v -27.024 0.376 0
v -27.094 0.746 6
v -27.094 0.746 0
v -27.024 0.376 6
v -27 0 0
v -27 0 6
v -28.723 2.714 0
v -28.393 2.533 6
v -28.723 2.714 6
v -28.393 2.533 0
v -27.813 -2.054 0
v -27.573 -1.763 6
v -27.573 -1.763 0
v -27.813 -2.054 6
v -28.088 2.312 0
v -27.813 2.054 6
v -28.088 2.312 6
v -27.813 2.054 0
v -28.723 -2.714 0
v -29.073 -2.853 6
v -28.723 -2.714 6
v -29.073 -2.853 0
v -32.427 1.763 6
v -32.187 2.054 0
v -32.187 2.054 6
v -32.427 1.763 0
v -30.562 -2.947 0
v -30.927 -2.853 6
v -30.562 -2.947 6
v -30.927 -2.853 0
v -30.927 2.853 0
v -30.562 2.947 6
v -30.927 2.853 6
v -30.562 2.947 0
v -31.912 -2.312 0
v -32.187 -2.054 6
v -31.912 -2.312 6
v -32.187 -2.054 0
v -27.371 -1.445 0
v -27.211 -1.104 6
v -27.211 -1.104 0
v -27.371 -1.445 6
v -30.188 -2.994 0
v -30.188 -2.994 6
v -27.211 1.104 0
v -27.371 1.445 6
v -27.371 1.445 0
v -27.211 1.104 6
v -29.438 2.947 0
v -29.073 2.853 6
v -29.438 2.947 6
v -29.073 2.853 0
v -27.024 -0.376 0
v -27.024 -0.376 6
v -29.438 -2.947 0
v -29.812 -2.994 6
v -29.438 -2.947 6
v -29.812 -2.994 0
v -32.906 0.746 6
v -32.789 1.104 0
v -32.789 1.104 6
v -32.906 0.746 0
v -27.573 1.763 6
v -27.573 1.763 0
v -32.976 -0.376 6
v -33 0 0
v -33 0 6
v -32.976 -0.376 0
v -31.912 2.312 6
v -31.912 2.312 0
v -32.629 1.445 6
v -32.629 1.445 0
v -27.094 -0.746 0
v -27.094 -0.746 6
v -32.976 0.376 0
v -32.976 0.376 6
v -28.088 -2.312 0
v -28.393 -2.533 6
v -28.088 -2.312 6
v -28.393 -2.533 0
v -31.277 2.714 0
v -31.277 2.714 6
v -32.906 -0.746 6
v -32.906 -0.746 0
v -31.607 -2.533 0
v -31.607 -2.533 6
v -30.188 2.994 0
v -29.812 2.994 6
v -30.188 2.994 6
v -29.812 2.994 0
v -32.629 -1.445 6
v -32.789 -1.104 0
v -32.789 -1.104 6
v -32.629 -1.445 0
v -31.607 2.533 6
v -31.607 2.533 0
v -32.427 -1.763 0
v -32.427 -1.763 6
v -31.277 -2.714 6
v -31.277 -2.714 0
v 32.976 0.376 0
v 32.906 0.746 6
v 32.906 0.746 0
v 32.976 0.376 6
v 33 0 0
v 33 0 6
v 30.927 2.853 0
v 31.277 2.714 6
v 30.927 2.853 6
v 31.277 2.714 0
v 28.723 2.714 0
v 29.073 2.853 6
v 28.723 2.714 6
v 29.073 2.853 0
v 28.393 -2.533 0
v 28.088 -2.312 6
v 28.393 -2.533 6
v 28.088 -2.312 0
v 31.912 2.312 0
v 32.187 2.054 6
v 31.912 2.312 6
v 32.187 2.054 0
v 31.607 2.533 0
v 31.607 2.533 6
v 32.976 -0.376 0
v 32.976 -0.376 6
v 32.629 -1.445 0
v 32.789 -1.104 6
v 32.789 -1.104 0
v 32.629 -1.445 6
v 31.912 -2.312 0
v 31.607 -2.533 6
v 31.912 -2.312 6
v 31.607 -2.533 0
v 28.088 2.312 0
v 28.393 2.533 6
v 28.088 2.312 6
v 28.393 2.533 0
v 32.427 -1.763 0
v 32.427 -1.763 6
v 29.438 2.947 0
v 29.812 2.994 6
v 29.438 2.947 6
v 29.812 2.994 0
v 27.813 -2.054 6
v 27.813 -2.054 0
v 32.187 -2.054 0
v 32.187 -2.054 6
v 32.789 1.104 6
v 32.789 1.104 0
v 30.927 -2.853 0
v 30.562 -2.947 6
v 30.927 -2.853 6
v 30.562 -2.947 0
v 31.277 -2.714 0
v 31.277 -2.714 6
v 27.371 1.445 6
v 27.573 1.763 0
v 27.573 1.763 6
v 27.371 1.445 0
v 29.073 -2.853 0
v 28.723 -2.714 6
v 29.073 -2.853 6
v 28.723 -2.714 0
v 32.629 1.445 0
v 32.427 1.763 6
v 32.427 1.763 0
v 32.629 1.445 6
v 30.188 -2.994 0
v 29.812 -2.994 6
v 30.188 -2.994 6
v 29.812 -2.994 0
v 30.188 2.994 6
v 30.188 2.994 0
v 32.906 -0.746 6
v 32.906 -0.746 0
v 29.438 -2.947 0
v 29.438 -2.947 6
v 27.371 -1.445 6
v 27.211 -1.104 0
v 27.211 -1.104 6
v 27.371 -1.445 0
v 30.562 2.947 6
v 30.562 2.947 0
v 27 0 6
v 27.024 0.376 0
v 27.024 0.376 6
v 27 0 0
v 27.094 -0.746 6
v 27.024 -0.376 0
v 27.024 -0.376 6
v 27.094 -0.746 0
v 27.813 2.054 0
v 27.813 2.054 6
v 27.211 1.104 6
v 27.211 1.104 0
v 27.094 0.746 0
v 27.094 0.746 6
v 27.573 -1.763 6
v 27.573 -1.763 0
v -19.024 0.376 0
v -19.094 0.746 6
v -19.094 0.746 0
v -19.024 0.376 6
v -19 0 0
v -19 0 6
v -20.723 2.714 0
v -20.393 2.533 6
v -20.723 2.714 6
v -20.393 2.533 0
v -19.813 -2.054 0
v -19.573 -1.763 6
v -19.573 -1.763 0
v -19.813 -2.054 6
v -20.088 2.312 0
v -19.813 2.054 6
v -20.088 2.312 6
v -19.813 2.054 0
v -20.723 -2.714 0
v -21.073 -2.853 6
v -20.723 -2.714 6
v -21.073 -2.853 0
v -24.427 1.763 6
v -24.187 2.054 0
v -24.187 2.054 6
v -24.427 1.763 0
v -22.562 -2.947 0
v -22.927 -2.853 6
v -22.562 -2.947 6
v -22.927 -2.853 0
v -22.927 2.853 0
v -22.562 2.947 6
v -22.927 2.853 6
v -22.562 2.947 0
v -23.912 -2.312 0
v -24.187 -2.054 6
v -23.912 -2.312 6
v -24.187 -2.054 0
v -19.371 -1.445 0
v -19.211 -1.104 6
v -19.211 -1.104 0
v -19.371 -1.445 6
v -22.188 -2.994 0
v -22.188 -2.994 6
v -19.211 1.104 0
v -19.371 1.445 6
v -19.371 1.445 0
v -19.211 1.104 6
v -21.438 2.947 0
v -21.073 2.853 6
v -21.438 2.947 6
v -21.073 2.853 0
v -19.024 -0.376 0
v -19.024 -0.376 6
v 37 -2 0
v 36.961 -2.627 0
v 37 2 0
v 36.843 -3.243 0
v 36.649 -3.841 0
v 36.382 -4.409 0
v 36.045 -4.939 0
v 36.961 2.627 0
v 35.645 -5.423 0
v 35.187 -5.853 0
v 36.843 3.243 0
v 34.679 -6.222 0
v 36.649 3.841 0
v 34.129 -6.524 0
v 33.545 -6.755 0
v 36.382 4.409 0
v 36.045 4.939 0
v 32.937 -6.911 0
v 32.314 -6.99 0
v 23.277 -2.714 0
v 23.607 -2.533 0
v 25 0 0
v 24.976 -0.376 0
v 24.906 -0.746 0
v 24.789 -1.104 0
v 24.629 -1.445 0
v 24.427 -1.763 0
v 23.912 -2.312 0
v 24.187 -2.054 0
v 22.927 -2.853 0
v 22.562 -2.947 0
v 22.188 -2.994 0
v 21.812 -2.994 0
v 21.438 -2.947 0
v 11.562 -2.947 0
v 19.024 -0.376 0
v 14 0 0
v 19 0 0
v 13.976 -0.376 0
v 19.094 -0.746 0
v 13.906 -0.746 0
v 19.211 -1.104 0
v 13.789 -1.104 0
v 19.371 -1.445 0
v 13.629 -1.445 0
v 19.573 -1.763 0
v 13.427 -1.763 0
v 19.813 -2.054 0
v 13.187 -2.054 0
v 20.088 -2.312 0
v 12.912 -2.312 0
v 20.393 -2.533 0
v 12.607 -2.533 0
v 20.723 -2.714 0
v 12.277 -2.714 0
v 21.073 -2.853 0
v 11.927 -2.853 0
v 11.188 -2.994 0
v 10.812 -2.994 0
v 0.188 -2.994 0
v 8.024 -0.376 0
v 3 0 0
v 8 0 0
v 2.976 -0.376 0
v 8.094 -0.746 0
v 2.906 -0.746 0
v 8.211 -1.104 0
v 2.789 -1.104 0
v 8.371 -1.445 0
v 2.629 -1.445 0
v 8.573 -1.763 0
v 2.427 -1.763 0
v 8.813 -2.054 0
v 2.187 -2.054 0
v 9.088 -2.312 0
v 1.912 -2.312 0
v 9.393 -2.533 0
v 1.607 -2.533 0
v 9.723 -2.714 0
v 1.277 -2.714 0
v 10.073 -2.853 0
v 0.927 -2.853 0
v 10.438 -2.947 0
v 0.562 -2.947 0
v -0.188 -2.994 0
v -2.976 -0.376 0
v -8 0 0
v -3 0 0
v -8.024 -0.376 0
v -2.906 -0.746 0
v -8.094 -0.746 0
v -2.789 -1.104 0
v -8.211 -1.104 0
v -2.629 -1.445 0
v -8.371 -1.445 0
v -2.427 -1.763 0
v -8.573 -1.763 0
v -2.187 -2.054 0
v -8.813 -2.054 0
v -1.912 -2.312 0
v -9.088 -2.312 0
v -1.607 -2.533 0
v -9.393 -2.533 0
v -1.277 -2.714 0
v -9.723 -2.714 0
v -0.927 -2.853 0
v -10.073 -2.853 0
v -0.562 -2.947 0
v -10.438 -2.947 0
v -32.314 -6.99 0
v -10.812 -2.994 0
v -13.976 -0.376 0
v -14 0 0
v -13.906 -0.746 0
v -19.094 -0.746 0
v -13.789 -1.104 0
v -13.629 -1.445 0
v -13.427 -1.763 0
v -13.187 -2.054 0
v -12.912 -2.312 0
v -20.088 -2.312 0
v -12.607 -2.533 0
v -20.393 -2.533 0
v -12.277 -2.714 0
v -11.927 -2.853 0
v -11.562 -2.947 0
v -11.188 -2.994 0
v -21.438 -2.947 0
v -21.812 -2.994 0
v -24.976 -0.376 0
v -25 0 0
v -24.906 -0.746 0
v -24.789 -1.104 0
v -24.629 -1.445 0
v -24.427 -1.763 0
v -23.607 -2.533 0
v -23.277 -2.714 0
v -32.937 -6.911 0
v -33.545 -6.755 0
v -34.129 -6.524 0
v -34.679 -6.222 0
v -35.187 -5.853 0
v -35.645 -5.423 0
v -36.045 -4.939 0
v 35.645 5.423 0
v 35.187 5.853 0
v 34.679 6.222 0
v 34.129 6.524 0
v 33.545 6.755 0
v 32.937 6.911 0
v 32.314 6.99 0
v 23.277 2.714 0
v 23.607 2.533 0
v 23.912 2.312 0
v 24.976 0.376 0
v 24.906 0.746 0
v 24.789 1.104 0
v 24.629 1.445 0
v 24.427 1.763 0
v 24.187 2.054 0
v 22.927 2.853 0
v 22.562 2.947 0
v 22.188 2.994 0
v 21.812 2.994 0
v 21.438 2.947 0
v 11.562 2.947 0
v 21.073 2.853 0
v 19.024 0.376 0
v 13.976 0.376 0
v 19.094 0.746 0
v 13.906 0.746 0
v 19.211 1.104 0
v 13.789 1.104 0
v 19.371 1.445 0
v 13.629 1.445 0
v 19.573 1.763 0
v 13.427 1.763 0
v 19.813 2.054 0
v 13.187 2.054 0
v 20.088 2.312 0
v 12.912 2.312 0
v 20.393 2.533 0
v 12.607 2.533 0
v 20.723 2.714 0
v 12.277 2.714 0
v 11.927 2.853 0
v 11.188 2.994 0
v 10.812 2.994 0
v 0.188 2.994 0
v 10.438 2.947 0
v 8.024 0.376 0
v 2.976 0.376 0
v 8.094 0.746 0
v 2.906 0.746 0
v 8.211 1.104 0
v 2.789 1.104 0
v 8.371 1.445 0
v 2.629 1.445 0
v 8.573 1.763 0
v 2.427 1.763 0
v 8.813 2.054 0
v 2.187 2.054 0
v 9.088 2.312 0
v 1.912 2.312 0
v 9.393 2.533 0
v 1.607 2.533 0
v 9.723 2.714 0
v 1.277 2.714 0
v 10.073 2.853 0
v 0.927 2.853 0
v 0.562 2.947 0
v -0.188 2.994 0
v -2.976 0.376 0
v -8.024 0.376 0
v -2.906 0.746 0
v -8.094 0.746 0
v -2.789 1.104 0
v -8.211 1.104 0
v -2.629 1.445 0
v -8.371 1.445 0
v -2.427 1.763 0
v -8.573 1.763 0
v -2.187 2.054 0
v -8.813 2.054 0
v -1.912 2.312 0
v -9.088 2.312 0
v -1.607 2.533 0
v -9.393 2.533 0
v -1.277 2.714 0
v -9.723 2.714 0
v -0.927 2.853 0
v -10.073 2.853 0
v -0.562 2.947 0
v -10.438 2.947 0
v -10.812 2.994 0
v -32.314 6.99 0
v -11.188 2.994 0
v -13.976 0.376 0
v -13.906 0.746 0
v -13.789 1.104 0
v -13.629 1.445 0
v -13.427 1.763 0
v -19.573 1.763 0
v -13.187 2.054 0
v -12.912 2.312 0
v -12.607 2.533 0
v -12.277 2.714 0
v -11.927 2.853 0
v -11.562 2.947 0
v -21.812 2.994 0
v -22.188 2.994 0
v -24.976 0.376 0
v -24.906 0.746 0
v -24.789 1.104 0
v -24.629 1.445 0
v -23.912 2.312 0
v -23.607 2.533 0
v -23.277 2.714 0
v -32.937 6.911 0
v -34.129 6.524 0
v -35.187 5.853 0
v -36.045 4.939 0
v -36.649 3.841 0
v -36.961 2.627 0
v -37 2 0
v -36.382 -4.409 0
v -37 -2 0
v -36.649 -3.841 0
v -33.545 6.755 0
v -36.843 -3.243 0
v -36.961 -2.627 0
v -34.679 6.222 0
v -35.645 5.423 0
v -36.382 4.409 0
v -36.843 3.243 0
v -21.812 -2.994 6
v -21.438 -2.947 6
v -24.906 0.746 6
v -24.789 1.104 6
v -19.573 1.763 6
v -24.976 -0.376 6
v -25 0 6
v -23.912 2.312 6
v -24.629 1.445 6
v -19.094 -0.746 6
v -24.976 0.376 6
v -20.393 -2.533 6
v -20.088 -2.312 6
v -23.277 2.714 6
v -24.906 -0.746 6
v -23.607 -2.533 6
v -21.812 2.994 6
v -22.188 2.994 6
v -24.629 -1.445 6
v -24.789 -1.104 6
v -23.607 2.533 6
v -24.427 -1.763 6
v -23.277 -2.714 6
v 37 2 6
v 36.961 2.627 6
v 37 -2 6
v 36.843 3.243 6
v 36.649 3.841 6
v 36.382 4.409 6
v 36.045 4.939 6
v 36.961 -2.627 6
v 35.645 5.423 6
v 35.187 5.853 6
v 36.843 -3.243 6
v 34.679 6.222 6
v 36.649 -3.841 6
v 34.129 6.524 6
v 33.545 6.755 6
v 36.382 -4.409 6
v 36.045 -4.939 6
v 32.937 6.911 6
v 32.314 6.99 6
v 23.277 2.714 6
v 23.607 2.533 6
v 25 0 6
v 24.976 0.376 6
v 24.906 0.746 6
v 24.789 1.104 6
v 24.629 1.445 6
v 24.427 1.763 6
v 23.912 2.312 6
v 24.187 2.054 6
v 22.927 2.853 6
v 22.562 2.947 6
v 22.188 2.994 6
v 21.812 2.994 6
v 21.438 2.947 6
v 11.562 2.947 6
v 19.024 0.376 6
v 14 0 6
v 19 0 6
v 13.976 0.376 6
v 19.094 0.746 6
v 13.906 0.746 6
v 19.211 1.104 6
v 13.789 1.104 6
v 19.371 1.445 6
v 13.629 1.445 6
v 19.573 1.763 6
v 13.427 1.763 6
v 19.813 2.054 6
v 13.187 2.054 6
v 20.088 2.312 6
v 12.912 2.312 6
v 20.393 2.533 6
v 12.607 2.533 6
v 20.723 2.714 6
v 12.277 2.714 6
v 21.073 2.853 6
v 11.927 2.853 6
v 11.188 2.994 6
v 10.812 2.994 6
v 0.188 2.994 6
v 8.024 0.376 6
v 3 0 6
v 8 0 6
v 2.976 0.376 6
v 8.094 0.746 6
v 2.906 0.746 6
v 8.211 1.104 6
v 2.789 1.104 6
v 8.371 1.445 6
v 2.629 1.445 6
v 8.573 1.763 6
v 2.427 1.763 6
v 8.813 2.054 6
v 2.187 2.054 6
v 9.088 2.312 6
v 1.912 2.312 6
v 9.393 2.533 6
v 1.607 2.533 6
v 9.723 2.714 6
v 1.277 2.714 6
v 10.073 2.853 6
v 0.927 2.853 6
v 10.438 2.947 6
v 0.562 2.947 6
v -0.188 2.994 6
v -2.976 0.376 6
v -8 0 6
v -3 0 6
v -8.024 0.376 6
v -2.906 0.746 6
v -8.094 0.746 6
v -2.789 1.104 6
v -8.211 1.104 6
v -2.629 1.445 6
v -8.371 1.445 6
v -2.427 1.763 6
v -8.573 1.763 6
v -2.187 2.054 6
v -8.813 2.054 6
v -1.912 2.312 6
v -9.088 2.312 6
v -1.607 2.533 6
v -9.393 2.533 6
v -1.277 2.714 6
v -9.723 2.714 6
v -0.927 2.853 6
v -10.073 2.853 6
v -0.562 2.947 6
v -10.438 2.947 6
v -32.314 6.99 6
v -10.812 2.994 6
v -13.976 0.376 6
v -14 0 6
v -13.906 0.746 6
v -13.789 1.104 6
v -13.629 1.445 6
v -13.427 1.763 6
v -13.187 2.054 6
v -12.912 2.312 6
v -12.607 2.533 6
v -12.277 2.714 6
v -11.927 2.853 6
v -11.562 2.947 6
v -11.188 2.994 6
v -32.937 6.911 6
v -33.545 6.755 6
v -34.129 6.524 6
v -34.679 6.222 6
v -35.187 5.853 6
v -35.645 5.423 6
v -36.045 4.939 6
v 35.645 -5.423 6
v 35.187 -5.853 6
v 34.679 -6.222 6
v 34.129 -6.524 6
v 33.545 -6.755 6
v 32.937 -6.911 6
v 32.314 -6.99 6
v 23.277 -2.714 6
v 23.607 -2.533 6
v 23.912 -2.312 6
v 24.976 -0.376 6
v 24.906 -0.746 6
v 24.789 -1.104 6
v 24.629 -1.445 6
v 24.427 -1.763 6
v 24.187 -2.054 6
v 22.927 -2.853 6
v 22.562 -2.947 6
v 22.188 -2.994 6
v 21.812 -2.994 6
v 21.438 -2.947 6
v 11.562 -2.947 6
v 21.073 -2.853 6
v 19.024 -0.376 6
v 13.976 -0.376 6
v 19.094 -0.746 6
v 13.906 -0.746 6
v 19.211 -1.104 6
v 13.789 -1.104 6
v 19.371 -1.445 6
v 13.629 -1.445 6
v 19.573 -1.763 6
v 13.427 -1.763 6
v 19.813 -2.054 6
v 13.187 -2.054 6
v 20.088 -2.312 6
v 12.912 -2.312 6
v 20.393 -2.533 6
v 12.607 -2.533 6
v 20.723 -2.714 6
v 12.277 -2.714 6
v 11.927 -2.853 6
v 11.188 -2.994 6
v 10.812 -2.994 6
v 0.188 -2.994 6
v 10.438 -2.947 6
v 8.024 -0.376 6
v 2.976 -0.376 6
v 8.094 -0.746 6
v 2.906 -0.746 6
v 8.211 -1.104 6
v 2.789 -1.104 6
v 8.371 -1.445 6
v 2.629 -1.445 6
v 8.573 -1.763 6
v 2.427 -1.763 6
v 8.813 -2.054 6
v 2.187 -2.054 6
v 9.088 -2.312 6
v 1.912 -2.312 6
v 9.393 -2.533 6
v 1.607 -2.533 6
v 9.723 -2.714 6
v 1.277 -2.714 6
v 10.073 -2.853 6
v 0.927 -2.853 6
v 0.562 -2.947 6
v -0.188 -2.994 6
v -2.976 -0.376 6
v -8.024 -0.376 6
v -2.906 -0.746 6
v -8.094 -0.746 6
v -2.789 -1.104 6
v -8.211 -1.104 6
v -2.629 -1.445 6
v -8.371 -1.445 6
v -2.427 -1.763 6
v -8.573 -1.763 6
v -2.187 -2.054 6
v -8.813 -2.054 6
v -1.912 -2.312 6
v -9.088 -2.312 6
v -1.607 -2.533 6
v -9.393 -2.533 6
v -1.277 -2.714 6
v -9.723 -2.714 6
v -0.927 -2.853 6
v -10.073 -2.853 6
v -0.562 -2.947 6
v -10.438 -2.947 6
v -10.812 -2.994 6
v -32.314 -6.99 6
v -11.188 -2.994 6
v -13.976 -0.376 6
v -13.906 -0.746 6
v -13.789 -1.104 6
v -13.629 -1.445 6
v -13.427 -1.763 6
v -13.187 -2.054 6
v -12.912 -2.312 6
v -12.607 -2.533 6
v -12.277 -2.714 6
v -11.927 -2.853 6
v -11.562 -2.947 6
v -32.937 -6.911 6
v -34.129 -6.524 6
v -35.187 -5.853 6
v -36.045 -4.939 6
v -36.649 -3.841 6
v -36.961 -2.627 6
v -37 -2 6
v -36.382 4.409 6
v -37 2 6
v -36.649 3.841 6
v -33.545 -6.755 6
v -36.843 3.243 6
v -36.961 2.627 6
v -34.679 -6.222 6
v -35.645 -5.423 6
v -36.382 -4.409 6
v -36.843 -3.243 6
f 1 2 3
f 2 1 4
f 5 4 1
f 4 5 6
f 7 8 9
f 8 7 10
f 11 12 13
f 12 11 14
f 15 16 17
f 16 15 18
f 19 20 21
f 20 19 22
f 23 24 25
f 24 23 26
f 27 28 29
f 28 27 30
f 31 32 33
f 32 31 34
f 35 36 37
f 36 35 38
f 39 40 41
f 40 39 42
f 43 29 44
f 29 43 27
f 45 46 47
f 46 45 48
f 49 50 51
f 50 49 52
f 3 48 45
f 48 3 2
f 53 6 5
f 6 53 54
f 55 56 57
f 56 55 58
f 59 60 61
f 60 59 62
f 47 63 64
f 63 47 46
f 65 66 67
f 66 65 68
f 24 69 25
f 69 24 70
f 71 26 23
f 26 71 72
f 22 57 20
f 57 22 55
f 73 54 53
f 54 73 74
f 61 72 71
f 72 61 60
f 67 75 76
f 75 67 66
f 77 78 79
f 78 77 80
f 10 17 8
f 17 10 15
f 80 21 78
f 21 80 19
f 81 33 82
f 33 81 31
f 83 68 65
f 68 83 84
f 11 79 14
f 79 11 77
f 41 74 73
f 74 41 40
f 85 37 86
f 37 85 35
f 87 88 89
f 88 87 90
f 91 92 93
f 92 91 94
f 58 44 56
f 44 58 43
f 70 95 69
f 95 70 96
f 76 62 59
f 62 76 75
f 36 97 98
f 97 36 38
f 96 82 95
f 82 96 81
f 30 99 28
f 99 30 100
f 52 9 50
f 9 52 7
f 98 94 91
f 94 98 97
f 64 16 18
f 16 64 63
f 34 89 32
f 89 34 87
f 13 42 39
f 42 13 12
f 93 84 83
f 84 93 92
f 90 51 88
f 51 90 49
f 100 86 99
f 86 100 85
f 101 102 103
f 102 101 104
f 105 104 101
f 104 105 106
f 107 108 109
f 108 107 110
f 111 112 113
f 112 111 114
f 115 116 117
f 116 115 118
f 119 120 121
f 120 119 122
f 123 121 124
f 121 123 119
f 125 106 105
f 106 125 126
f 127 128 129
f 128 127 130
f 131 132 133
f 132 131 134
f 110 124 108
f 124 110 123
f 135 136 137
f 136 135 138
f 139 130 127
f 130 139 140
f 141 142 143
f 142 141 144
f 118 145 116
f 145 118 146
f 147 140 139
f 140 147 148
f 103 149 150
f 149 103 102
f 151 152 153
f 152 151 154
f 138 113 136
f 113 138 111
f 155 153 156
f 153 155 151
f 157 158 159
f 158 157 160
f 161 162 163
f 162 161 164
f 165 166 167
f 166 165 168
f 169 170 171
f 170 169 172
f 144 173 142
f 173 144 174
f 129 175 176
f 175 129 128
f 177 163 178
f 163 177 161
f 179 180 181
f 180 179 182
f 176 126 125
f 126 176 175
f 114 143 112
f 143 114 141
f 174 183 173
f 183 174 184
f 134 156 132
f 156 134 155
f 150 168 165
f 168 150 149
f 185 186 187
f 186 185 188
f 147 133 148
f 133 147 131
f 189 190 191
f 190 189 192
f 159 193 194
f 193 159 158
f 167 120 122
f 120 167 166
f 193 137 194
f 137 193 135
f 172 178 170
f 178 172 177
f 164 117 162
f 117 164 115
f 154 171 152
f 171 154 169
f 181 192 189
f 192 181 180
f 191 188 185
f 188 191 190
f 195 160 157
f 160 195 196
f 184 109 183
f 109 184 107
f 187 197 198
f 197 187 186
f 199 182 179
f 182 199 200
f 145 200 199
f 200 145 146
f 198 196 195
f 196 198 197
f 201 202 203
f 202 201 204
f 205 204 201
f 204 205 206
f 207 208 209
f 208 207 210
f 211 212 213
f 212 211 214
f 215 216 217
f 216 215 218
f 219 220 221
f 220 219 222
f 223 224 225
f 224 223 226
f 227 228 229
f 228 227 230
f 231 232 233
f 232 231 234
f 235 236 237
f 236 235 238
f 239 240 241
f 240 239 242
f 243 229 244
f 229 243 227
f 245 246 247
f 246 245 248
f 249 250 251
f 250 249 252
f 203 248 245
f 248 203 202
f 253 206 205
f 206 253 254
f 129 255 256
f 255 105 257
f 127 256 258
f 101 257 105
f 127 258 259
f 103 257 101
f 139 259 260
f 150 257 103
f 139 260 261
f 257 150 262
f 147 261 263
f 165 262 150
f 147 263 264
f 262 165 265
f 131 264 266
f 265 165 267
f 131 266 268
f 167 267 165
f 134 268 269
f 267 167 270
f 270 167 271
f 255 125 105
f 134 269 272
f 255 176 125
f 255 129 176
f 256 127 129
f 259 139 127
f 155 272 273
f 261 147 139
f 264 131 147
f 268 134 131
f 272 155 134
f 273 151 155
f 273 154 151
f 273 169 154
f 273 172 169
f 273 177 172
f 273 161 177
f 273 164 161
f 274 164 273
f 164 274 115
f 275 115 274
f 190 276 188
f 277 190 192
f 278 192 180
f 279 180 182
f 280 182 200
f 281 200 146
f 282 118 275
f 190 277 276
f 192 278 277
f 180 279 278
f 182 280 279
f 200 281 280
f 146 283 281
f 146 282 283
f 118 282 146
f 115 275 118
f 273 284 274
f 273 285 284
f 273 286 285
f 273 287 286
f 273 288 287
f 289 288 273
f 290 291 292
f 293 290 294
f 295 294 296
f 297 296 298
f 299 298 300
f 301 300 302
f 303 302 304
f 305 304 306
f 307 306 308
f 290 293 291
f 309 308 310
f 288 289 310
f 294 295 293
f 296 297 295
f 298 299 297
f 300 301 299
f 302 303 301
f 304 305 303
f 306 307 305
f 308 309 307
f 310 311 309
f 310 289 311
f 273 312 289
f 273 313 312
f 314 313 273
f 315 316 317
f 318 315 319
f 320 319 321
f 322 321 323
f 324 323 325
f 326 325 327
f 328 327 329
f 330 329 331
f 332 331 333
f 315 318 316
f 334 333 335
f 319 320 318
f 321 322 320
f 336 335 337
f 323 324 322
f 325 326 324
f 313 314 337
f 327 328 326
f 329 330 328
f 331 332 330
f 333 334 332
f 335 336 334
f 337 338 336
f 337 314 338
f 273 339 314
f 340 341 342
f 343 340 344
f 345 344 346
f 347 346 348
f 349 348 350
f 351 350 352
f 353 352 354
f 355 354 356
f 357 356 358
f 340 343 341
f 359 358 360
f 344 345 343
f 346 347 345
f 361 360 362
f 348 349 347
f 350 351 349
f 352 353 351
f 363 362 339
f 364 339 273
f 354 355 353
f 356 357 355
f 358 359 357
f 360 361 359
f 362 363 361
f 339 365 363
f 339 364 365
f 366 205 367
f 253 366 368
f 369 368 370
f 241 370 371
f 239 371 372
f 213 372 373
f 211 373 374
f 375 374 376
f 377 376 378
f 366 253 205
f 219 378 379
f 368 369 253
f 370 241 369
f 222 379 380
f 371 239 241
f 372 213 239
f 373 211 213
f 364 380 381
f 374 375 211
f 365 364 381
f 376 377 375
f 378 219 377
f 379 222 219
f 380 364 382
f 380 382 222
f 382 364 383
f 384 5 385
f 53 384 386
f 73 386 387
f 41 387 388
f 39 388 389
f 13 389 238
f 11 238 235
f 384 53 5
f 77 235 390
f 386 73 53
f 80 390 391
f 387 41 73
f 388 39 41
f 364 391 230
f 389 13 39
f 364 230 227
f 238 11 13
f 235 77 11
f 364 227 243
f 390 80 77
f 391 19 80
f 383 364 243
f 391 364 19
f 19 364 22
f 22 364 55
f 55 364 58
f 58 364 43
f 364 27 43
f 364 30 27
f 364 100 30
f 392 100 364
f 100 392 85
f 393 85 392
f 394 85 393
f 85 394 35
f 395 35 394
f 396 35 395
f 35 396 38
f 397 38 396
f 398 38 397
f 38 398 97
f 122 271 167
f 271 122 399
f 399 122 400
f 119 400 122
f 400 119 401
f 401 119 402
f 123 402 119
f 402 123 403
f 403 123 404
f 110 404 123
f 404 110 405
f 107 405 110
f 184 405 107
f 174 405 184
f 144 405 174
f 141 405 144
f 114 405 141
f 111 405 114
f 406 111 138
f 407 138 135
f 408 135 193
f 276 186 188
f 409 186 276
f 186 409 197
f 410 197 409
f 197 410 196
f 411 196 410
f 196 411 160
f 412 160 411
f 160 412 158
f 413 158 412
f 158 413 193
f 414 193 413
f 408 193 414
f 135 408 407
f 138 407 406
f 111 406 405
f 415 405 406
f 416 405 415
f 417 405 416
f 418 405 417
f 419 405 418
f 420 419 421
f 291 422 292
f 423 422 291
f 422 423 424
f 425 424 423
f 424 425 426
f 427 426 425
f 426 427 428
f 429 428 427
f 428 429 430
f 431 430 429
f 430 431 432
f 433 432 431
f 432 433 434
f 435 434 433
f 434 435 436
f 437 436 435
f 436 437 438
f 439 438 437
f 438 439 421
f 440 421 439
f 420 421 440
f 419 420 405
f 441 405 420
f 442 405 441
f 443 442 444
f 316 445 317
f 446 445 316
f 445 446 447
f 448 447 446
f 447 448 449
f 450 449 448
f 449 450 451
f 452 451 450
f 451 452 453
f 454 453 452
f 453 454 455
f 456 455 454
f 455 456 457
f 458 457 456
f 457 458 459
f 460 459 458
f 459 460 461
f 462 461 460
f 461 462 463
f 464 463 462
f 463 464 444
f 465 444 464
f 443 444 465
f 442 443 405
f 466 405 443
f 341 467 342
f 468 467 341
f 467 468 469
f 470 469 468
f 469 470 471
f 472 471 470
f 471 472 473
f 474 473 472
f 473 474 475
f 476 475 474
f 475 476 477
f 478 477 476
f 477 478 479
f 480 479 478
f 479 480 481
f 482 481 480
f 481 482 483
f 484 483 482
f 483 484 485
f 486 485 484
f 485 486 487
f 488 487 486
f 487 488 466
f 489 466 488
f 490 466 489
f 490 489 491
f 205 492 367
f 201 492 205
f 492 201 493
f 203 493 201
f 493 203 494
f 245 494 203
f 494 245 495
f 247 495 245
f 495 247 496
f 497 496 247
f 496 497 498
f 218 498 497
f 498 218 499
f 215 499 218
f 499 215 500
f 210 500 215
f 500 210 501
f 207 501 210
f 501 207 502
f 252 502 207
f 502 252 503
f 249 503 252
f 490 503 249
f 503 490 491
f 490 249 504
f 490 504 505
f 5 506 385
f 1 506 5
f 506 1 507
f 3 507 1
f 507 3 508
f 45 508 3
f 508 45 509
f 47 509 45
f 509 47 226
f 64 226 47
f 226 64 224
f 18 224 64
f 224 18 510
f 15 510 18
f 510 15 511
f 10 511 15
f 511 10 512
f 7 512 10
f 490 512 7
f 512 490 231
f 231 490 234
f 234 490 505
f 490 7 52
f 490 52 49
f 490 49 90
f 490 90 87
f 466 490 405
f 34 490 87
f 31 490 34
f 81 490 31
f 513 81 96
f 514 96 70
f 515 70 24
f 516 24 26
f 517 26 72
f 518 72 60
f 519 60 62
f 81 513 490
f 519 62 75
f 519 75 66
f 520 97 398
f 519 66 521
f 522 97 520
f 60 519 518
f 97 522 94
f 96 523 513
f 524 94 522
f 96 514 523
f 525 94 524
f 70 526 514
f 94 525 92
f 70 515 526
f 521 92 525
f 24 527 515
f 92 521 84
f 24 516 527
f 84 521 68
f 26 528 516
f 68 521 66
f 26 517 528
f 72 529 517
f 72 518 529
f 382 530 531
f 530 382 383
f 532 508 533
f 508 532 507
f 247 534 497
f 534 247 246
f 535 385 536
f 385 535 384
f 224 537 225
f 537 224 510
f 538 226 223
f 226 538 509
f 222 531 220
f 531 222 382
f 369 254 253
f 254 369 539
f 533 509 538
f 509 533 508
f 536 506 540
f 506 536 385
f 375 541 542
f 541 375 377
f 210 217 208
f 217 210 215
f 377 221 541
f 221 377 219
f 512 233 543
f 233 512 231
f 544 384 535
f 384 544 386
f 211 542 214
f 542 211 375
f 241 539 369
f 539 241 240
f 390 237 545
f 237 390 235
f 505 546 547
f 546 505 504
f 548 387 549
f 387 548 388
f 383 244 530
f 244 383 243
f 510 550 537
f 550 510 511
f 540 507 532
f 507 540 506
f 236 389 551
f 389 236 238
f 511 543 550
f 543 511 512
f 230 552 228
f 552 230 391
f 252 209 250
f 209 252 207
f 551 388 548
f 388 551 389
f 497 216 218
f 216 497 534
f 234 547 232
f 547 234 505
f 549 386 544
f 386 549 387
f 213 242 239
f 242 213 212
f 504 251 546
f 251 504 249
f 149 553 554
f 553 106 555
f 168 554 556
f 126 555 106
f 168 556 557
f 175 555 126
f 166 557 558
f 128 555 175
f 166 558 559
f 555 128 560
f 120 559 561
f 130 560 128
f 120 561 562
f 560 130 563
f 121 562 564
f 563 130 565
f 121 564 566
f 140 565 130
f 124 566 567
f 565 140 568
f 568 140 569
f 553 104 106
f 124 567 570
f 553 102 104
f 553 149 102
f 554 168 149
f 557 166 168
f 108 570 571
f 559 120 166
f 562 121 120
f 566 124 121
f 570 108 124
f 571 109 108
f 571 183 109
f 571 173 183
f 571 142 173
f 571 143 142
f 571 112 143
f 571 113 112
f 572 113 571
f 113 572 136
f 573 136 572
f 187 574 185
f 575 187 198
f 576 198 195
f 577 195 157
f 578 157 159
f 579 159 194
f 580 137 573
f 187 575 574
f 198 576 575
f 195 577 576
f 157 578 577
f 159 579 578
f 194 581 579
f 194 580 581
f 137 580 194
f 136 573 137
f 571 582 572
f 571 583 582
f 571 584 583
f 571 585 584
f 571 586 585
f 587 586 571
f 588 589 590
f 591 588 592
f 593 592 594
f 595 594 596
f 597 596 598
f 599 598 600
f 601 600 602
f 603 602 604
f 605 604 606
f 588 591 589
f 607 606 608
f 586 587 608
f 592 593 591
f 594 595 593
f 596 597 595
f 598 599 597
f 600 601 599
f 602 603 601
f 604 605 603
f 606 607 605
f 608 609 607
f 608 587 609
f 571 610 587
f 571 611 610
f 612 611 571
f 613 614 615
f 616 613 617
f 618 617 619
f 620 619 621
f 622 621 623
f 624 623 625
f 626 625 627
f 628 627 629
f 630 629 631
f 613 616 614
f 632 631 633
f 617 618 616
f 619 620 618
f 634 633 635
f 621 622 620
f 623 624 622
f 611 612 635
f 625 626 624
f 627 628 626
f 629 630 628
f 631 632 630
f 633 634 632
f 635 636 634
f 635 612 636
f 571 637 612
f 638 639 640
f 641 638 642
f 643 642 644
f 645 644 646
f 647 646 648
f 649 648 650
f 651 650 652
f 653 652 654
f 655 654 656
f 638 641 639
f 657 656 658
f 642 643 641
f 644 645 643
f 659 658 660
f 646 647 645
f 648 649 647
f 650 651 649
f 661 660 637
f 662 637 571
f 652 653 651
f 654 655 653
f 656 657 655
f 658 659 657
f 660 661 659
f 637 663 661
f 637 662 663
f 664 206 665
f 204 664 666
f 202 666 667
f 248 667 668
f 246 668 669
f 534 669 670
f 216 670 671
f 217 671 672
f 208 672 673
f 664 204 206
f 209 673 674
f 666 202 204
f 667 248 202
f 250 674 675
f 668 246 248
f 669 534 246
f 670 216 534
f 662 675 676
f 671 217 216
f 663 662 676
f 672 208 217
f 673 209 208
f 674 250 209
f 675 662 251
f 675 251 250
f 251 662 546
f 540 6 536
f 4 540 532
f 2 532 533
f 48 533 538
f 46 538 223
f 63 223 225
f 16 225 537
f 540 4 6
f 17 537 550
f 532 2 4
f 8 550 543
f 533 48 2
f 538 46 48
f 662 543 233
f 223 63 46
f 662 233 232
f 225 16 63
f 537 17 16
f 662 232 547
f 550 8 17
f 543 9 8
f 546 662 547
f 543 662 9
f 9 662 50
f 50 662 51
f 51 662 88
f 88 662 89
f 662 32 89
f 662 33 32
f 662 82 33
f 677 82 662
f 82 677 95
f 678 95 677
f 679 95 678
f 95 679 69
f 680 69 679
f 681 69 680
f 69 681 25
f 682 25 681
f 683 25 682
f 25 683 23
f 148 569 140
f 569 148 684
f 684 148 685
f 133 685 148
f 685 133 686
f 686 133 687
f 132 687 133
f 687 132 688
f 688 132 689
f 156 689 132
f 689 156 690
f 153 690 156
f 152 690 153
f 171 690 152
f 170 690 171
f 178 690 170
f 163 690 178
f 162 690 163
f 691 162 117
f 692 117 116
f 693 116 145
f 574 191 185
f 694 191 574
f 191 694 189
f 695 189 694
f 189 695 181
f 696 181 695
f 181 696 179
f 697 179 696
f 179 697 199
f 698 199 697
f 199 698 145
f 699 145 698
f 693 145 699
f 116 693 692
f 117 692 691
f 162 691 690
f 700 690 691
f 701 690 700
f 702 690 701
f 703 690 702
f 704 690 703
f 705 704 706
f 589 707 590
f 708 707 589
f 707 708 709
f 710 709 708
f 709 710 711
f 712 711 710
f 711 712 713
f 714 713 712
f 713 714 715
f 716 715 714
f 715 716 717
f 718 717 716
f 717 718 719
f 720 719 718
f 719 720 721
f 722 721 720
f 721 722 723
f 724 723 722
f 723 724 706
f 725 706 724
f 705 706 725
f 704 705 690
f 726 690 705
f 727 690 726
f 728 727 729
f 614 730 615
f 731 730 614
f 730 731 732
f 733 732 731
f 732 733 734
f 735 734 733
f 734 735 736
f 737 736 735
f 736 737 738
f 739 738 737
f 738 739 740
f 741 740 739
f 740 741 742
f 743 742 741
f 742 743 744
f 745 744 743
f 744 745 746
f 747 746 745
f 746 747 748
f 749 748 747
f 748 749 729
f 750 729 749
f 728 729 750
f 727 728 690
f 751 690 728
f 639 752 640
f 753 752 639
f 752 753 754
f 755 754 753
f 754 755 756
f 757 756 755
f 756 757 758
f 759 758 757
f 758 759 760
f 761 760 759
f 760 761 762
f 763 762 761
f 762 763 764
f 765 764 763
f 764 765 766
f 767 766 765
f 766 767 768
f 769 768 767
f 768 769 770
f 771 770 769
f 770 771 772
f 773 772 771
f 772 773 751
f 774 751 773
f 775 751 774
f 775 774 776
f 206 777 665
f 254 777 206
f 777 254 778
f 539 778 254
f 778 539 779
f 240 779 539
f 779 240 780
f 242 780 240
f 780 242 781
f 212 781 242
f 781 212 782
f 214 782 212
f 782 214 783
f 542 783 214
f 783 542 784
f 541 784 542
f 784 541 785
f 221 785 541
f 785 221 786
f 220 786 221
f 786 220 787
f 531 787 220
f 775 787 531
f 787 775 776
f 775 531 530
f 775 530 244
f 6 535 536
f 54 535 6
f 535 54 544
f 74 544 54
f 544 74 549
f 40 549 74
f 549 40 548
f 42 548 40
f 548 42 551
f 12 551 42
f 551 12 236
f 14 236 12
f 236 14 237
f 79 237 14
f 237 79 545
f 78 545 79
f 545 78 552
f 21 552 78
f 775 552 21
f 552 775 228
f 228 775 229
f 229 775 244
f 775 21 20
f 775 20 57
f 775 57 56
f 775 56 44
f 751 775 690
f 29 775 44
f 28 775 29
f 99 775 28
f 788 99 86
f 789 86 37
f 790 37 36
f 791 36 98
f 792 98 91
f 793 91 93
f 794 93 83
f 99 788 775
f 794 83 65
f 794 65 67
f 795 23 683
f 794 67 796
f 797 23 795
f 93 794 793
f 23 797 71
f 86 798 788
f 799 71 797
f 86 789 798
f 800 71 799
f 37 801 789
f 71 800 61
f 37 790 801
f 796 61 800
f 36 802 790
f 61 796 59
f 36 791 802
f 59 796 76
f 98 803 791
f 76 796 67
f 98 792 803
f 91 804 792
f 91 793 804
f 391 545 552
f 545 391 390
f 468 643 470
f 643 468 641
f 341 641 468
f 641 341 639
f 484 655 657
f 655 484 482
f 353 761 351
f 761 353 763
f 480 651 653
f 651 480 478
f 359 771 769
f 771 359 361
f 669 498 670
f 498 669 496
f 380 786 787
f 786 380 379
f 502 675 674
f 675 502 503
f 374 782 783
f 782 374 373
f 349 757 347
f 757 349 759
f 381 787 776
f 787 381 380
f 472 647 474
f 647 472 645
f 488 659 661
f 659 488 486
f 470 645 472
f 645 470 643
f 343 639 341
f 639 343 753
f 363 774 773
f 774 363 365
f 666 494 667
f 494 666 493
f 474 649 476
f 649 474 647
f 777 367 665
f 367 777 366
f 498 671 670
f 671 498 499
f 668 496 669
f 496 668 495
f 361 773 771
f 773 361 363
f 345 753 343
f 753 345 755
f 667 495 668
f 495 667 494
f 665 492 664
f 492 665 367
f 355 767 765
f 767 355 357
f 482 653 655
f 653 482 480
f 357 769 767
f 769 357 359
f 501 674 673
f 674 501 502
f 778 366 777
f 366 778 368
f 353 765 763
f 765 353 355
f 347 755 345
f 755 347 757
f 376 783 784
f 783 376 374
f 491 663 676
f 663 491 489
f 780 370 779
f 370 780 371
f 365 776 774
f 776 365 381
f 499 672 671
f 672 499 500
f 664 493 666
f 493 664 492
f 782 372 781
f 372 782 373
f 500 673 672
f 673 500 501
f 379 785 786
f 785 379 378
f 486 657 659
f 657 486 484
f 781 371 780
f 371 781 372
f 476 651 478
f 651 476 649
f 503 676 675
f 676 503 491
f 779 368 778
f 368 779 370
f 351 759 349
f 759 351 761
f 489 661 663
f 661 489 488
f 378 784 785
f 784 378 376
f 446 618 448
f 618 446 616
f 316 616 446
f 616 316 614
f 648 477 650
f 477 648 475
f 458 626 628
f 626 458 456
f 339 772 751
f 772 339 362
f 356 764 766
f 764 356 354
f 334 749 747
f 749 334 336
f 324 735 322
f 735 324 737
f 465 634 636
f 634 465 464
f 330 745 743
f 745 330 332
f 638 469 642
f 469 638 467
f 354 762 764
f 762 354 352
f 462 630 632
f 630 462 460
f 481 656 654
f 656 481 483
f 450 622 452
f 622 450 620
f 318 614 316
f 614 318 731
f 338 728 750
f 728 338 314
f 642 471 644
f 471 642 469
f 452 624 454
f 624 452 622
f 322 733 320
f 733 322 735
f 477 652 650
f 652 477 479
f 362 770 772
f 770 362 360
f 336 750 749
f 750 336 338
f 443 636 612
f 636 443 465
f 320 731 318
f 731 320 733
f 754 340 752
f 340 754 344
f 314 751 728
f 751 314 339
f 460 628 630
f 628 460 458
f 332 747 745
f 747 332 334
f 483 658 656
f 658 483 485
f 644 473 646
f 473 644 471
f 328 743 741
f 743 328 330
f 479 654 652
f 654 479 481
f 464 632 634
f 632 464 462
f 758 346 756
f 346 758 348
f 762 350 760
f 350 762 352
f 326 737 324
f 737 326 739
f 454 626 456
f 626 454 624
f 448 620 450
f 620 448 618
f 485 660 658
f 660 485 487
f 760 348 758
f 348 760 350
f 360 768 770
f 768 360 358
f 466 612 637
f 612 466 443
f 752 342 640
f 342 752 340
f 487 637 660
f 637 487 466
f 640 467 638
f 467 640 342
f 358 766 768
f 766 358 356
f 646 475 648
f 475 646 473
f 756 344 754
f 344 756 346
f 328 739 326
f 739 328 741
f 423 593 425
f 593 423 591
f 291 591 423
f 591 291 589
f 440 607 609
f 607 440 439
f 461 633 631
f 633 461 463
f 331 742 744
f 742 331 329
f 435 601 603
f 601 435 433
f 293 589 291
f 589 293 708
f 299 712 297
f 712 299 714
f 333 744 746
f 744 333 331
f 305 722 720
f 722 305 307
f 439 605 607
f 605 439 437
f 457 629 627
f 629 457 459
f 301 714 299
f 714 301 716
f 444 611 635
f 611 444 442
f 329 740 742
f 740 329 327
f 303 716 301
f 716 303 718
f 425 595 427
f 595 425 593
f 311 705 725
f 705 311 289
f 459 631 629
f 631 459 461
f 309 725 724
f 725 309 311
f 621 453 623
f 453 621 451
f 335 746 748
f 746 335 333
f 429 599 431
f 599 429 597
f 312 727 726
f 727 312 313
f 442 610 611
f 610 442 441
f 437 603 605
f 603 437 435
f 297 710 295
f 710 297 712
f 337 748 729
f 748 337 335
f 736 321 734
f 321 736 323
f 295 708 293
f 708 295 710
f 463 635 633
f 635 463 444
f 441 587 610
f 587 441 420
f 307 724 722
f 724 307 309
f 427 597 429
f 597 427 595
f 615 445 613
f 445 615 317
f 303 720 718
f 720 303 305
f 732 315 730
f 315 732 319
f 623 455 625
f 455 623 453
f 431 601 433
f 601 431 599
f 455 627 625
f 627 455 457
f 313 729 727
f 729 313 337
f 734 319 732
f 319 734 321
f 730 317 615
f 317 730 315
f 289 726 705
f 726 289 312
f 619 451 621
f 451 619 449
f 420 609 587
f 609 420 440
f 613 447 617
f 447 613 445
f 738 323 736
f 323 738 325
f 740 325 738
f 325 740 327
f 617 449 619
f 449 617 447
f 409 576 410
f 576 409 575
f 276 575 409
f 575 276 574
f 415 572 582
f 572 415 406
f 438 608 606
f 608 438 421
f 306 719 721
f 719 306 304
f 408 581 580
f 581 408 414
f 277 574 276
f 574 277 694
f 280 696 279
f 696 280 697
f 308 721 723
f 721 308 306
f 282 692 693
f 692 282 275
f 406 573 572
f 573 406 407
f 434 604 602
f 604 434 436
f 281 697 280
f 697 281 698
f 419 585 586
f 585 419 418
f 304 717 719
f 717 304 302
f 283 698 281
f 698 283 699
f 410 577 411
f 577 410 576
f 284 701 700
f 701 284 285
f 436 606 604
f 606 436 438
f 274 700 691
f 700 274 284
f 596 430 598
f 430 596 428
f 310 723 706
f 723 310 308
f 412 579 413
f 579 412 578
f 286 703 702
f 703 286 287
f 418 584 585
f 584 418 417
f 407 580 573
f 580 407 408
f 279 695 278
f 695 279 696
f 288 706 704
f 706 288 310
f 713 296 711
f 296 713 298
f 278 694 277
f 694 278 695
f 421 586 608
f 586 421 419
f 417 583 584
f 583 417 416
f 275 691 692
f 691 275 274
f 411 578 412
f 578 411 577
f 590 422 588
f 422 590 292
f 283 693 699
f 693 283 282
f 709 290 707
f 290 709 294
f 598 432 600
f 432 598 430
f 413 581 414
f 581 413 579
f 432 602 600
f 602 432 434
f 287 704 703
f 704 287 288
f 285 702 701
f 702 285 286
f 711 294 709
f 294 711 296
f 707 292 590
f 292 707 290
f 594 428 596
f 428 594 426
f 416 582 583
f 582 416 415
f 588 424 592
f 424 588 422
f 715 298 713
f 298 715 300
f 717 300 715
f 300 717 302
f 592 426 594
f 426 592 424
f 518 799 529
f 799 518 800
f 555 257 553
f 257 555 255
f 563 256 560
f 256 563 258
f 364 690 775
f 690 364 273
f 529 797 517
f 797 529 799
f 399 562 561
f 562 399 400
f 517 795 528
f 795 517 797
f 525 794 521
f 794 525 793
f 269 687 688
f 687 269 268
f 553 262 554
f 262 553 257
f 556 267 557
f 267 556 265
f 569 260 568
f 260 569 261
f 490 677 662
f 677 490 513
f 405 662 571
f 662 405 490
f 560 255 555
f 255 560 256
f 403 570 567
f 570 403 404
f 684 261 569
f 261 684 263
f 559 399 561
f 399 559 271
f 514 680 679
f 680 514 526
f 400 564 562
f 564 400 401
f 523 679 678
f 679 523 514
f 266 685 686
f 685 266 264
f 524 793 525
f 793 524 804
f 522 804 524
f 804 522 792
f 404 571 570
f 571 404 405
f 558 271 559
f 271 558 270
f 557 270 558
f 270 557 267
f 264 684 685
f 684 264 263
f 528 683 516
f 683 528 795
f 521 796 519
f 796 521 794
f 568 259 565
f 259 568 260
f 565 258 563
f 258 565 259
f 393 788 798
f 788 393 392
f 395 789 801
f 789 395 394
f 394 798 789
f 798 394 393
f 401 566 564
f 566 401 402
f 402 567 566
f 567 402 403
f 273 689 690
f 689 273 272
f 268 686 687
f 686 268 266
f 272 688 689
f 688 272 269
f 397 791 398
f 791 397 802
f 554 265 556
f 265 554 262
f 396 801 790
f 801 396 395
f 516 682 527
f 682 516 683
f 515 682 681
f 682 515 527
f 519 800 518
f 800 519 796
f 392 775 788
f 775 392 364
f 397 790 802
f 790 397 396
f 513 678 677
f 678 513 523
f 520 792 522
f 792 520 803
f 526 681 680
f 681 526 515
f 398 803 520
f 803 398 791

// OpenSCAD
$fn = 50;


difference() {
	union() {
		hull() {
			translate(v = [-32.0000000000, 2.0000000000, 0]) {
				cylinder(h = 6, r = 5);
			}
			translate(v = [32.0000000000, 2.0000000000, 0]) {
				cylinder(h = 6, r = 5);
			}
			translate(v = [-32.0000000000, -2.0000000000, 0]) {
				cylinder(h = 6, r = 5);
			}
			translate(v = [32.0000000000, -2.0000000000, 0]) {
				cylinder(h = 6, r = 5);
			}
		}
	}
	union() {
		#translate(v = [-30.0000000000, 0.0000000000, 0]) {
			cylinder(h = 6, r = 3.0000000000);
		}
		#translate(v = [30.0000000000, 0.0000000000, 0]) {
			cylinder(h = 6, r = 3.0000000000);
		}
		#translate(v = [-30.0000000000, 0.0000000000, -100.0000000000]) {
			cylinder(h = 200, r = 3.0000000000);
		}
		#translate(v = [-30.0000000000, 0.0000000000, -100.0000000000]) {
			cylinder(h = 200, r = 3.0000000000);
		}
		#translate(v = [30.0000000000, 0.0000000000, -100.0000000000]) {
			cylinder(h = 200, r = 3.0000000000);
		}
		#translate(v = [30.0000000000, 0.0000000000, -100.0000000000]) {
			cylinder(h = 200, r = 3.0000000000);
		}
		#translate(v = [-30.0000000000, 0.0000000000, 0]) {
			cylinder(h = 6, r = 1.5000000000);
		}
		#translate(v = [30.0000000000, 0.0000000000, 0]) {
			cylinder(h = 6, r = 1.5000000000);
		}
		#translate(v = [-30.0000000000, 0.0000000000, 0]) {
			cylinder(h = 6, r = 1.5000000000);
		}
		#translate(v = [30.0000000000, 0.0000000000, 0]) {
			cylinder(h = 6, r = 1.5000000000);
		}
		#translate(v = [-30.0000000000, 0.0000000000, 0]) {
			cylinder(h = 6, r = 1.5000000000);
		}
		#translate(v = [30.0000000000, 0.0000000000, 0]) {
			cylinder(h = 6, r = 1.5000000000);
		}
		#translate(v = [-22.0000000000, 0, 0]) {
			cylinder(h = 6, r = 3.0000000000);
		}
		#translate(v = [-11.0000000000, 0, 0]) {
			cylinder(h = 6, r = 3.0000000000);
		}
		#cylinder(h = 6, r = 3.0000000000);
		#translate(v = [11.0000000000, 0, 0]) {
			cylinder(h = 6, r = 3.0000000000);
		}
		#translate(v = [22.0000000000, 0, 0]) {
			cylinder(h = 6, r = 3.0000000000);
		}
	}
}
